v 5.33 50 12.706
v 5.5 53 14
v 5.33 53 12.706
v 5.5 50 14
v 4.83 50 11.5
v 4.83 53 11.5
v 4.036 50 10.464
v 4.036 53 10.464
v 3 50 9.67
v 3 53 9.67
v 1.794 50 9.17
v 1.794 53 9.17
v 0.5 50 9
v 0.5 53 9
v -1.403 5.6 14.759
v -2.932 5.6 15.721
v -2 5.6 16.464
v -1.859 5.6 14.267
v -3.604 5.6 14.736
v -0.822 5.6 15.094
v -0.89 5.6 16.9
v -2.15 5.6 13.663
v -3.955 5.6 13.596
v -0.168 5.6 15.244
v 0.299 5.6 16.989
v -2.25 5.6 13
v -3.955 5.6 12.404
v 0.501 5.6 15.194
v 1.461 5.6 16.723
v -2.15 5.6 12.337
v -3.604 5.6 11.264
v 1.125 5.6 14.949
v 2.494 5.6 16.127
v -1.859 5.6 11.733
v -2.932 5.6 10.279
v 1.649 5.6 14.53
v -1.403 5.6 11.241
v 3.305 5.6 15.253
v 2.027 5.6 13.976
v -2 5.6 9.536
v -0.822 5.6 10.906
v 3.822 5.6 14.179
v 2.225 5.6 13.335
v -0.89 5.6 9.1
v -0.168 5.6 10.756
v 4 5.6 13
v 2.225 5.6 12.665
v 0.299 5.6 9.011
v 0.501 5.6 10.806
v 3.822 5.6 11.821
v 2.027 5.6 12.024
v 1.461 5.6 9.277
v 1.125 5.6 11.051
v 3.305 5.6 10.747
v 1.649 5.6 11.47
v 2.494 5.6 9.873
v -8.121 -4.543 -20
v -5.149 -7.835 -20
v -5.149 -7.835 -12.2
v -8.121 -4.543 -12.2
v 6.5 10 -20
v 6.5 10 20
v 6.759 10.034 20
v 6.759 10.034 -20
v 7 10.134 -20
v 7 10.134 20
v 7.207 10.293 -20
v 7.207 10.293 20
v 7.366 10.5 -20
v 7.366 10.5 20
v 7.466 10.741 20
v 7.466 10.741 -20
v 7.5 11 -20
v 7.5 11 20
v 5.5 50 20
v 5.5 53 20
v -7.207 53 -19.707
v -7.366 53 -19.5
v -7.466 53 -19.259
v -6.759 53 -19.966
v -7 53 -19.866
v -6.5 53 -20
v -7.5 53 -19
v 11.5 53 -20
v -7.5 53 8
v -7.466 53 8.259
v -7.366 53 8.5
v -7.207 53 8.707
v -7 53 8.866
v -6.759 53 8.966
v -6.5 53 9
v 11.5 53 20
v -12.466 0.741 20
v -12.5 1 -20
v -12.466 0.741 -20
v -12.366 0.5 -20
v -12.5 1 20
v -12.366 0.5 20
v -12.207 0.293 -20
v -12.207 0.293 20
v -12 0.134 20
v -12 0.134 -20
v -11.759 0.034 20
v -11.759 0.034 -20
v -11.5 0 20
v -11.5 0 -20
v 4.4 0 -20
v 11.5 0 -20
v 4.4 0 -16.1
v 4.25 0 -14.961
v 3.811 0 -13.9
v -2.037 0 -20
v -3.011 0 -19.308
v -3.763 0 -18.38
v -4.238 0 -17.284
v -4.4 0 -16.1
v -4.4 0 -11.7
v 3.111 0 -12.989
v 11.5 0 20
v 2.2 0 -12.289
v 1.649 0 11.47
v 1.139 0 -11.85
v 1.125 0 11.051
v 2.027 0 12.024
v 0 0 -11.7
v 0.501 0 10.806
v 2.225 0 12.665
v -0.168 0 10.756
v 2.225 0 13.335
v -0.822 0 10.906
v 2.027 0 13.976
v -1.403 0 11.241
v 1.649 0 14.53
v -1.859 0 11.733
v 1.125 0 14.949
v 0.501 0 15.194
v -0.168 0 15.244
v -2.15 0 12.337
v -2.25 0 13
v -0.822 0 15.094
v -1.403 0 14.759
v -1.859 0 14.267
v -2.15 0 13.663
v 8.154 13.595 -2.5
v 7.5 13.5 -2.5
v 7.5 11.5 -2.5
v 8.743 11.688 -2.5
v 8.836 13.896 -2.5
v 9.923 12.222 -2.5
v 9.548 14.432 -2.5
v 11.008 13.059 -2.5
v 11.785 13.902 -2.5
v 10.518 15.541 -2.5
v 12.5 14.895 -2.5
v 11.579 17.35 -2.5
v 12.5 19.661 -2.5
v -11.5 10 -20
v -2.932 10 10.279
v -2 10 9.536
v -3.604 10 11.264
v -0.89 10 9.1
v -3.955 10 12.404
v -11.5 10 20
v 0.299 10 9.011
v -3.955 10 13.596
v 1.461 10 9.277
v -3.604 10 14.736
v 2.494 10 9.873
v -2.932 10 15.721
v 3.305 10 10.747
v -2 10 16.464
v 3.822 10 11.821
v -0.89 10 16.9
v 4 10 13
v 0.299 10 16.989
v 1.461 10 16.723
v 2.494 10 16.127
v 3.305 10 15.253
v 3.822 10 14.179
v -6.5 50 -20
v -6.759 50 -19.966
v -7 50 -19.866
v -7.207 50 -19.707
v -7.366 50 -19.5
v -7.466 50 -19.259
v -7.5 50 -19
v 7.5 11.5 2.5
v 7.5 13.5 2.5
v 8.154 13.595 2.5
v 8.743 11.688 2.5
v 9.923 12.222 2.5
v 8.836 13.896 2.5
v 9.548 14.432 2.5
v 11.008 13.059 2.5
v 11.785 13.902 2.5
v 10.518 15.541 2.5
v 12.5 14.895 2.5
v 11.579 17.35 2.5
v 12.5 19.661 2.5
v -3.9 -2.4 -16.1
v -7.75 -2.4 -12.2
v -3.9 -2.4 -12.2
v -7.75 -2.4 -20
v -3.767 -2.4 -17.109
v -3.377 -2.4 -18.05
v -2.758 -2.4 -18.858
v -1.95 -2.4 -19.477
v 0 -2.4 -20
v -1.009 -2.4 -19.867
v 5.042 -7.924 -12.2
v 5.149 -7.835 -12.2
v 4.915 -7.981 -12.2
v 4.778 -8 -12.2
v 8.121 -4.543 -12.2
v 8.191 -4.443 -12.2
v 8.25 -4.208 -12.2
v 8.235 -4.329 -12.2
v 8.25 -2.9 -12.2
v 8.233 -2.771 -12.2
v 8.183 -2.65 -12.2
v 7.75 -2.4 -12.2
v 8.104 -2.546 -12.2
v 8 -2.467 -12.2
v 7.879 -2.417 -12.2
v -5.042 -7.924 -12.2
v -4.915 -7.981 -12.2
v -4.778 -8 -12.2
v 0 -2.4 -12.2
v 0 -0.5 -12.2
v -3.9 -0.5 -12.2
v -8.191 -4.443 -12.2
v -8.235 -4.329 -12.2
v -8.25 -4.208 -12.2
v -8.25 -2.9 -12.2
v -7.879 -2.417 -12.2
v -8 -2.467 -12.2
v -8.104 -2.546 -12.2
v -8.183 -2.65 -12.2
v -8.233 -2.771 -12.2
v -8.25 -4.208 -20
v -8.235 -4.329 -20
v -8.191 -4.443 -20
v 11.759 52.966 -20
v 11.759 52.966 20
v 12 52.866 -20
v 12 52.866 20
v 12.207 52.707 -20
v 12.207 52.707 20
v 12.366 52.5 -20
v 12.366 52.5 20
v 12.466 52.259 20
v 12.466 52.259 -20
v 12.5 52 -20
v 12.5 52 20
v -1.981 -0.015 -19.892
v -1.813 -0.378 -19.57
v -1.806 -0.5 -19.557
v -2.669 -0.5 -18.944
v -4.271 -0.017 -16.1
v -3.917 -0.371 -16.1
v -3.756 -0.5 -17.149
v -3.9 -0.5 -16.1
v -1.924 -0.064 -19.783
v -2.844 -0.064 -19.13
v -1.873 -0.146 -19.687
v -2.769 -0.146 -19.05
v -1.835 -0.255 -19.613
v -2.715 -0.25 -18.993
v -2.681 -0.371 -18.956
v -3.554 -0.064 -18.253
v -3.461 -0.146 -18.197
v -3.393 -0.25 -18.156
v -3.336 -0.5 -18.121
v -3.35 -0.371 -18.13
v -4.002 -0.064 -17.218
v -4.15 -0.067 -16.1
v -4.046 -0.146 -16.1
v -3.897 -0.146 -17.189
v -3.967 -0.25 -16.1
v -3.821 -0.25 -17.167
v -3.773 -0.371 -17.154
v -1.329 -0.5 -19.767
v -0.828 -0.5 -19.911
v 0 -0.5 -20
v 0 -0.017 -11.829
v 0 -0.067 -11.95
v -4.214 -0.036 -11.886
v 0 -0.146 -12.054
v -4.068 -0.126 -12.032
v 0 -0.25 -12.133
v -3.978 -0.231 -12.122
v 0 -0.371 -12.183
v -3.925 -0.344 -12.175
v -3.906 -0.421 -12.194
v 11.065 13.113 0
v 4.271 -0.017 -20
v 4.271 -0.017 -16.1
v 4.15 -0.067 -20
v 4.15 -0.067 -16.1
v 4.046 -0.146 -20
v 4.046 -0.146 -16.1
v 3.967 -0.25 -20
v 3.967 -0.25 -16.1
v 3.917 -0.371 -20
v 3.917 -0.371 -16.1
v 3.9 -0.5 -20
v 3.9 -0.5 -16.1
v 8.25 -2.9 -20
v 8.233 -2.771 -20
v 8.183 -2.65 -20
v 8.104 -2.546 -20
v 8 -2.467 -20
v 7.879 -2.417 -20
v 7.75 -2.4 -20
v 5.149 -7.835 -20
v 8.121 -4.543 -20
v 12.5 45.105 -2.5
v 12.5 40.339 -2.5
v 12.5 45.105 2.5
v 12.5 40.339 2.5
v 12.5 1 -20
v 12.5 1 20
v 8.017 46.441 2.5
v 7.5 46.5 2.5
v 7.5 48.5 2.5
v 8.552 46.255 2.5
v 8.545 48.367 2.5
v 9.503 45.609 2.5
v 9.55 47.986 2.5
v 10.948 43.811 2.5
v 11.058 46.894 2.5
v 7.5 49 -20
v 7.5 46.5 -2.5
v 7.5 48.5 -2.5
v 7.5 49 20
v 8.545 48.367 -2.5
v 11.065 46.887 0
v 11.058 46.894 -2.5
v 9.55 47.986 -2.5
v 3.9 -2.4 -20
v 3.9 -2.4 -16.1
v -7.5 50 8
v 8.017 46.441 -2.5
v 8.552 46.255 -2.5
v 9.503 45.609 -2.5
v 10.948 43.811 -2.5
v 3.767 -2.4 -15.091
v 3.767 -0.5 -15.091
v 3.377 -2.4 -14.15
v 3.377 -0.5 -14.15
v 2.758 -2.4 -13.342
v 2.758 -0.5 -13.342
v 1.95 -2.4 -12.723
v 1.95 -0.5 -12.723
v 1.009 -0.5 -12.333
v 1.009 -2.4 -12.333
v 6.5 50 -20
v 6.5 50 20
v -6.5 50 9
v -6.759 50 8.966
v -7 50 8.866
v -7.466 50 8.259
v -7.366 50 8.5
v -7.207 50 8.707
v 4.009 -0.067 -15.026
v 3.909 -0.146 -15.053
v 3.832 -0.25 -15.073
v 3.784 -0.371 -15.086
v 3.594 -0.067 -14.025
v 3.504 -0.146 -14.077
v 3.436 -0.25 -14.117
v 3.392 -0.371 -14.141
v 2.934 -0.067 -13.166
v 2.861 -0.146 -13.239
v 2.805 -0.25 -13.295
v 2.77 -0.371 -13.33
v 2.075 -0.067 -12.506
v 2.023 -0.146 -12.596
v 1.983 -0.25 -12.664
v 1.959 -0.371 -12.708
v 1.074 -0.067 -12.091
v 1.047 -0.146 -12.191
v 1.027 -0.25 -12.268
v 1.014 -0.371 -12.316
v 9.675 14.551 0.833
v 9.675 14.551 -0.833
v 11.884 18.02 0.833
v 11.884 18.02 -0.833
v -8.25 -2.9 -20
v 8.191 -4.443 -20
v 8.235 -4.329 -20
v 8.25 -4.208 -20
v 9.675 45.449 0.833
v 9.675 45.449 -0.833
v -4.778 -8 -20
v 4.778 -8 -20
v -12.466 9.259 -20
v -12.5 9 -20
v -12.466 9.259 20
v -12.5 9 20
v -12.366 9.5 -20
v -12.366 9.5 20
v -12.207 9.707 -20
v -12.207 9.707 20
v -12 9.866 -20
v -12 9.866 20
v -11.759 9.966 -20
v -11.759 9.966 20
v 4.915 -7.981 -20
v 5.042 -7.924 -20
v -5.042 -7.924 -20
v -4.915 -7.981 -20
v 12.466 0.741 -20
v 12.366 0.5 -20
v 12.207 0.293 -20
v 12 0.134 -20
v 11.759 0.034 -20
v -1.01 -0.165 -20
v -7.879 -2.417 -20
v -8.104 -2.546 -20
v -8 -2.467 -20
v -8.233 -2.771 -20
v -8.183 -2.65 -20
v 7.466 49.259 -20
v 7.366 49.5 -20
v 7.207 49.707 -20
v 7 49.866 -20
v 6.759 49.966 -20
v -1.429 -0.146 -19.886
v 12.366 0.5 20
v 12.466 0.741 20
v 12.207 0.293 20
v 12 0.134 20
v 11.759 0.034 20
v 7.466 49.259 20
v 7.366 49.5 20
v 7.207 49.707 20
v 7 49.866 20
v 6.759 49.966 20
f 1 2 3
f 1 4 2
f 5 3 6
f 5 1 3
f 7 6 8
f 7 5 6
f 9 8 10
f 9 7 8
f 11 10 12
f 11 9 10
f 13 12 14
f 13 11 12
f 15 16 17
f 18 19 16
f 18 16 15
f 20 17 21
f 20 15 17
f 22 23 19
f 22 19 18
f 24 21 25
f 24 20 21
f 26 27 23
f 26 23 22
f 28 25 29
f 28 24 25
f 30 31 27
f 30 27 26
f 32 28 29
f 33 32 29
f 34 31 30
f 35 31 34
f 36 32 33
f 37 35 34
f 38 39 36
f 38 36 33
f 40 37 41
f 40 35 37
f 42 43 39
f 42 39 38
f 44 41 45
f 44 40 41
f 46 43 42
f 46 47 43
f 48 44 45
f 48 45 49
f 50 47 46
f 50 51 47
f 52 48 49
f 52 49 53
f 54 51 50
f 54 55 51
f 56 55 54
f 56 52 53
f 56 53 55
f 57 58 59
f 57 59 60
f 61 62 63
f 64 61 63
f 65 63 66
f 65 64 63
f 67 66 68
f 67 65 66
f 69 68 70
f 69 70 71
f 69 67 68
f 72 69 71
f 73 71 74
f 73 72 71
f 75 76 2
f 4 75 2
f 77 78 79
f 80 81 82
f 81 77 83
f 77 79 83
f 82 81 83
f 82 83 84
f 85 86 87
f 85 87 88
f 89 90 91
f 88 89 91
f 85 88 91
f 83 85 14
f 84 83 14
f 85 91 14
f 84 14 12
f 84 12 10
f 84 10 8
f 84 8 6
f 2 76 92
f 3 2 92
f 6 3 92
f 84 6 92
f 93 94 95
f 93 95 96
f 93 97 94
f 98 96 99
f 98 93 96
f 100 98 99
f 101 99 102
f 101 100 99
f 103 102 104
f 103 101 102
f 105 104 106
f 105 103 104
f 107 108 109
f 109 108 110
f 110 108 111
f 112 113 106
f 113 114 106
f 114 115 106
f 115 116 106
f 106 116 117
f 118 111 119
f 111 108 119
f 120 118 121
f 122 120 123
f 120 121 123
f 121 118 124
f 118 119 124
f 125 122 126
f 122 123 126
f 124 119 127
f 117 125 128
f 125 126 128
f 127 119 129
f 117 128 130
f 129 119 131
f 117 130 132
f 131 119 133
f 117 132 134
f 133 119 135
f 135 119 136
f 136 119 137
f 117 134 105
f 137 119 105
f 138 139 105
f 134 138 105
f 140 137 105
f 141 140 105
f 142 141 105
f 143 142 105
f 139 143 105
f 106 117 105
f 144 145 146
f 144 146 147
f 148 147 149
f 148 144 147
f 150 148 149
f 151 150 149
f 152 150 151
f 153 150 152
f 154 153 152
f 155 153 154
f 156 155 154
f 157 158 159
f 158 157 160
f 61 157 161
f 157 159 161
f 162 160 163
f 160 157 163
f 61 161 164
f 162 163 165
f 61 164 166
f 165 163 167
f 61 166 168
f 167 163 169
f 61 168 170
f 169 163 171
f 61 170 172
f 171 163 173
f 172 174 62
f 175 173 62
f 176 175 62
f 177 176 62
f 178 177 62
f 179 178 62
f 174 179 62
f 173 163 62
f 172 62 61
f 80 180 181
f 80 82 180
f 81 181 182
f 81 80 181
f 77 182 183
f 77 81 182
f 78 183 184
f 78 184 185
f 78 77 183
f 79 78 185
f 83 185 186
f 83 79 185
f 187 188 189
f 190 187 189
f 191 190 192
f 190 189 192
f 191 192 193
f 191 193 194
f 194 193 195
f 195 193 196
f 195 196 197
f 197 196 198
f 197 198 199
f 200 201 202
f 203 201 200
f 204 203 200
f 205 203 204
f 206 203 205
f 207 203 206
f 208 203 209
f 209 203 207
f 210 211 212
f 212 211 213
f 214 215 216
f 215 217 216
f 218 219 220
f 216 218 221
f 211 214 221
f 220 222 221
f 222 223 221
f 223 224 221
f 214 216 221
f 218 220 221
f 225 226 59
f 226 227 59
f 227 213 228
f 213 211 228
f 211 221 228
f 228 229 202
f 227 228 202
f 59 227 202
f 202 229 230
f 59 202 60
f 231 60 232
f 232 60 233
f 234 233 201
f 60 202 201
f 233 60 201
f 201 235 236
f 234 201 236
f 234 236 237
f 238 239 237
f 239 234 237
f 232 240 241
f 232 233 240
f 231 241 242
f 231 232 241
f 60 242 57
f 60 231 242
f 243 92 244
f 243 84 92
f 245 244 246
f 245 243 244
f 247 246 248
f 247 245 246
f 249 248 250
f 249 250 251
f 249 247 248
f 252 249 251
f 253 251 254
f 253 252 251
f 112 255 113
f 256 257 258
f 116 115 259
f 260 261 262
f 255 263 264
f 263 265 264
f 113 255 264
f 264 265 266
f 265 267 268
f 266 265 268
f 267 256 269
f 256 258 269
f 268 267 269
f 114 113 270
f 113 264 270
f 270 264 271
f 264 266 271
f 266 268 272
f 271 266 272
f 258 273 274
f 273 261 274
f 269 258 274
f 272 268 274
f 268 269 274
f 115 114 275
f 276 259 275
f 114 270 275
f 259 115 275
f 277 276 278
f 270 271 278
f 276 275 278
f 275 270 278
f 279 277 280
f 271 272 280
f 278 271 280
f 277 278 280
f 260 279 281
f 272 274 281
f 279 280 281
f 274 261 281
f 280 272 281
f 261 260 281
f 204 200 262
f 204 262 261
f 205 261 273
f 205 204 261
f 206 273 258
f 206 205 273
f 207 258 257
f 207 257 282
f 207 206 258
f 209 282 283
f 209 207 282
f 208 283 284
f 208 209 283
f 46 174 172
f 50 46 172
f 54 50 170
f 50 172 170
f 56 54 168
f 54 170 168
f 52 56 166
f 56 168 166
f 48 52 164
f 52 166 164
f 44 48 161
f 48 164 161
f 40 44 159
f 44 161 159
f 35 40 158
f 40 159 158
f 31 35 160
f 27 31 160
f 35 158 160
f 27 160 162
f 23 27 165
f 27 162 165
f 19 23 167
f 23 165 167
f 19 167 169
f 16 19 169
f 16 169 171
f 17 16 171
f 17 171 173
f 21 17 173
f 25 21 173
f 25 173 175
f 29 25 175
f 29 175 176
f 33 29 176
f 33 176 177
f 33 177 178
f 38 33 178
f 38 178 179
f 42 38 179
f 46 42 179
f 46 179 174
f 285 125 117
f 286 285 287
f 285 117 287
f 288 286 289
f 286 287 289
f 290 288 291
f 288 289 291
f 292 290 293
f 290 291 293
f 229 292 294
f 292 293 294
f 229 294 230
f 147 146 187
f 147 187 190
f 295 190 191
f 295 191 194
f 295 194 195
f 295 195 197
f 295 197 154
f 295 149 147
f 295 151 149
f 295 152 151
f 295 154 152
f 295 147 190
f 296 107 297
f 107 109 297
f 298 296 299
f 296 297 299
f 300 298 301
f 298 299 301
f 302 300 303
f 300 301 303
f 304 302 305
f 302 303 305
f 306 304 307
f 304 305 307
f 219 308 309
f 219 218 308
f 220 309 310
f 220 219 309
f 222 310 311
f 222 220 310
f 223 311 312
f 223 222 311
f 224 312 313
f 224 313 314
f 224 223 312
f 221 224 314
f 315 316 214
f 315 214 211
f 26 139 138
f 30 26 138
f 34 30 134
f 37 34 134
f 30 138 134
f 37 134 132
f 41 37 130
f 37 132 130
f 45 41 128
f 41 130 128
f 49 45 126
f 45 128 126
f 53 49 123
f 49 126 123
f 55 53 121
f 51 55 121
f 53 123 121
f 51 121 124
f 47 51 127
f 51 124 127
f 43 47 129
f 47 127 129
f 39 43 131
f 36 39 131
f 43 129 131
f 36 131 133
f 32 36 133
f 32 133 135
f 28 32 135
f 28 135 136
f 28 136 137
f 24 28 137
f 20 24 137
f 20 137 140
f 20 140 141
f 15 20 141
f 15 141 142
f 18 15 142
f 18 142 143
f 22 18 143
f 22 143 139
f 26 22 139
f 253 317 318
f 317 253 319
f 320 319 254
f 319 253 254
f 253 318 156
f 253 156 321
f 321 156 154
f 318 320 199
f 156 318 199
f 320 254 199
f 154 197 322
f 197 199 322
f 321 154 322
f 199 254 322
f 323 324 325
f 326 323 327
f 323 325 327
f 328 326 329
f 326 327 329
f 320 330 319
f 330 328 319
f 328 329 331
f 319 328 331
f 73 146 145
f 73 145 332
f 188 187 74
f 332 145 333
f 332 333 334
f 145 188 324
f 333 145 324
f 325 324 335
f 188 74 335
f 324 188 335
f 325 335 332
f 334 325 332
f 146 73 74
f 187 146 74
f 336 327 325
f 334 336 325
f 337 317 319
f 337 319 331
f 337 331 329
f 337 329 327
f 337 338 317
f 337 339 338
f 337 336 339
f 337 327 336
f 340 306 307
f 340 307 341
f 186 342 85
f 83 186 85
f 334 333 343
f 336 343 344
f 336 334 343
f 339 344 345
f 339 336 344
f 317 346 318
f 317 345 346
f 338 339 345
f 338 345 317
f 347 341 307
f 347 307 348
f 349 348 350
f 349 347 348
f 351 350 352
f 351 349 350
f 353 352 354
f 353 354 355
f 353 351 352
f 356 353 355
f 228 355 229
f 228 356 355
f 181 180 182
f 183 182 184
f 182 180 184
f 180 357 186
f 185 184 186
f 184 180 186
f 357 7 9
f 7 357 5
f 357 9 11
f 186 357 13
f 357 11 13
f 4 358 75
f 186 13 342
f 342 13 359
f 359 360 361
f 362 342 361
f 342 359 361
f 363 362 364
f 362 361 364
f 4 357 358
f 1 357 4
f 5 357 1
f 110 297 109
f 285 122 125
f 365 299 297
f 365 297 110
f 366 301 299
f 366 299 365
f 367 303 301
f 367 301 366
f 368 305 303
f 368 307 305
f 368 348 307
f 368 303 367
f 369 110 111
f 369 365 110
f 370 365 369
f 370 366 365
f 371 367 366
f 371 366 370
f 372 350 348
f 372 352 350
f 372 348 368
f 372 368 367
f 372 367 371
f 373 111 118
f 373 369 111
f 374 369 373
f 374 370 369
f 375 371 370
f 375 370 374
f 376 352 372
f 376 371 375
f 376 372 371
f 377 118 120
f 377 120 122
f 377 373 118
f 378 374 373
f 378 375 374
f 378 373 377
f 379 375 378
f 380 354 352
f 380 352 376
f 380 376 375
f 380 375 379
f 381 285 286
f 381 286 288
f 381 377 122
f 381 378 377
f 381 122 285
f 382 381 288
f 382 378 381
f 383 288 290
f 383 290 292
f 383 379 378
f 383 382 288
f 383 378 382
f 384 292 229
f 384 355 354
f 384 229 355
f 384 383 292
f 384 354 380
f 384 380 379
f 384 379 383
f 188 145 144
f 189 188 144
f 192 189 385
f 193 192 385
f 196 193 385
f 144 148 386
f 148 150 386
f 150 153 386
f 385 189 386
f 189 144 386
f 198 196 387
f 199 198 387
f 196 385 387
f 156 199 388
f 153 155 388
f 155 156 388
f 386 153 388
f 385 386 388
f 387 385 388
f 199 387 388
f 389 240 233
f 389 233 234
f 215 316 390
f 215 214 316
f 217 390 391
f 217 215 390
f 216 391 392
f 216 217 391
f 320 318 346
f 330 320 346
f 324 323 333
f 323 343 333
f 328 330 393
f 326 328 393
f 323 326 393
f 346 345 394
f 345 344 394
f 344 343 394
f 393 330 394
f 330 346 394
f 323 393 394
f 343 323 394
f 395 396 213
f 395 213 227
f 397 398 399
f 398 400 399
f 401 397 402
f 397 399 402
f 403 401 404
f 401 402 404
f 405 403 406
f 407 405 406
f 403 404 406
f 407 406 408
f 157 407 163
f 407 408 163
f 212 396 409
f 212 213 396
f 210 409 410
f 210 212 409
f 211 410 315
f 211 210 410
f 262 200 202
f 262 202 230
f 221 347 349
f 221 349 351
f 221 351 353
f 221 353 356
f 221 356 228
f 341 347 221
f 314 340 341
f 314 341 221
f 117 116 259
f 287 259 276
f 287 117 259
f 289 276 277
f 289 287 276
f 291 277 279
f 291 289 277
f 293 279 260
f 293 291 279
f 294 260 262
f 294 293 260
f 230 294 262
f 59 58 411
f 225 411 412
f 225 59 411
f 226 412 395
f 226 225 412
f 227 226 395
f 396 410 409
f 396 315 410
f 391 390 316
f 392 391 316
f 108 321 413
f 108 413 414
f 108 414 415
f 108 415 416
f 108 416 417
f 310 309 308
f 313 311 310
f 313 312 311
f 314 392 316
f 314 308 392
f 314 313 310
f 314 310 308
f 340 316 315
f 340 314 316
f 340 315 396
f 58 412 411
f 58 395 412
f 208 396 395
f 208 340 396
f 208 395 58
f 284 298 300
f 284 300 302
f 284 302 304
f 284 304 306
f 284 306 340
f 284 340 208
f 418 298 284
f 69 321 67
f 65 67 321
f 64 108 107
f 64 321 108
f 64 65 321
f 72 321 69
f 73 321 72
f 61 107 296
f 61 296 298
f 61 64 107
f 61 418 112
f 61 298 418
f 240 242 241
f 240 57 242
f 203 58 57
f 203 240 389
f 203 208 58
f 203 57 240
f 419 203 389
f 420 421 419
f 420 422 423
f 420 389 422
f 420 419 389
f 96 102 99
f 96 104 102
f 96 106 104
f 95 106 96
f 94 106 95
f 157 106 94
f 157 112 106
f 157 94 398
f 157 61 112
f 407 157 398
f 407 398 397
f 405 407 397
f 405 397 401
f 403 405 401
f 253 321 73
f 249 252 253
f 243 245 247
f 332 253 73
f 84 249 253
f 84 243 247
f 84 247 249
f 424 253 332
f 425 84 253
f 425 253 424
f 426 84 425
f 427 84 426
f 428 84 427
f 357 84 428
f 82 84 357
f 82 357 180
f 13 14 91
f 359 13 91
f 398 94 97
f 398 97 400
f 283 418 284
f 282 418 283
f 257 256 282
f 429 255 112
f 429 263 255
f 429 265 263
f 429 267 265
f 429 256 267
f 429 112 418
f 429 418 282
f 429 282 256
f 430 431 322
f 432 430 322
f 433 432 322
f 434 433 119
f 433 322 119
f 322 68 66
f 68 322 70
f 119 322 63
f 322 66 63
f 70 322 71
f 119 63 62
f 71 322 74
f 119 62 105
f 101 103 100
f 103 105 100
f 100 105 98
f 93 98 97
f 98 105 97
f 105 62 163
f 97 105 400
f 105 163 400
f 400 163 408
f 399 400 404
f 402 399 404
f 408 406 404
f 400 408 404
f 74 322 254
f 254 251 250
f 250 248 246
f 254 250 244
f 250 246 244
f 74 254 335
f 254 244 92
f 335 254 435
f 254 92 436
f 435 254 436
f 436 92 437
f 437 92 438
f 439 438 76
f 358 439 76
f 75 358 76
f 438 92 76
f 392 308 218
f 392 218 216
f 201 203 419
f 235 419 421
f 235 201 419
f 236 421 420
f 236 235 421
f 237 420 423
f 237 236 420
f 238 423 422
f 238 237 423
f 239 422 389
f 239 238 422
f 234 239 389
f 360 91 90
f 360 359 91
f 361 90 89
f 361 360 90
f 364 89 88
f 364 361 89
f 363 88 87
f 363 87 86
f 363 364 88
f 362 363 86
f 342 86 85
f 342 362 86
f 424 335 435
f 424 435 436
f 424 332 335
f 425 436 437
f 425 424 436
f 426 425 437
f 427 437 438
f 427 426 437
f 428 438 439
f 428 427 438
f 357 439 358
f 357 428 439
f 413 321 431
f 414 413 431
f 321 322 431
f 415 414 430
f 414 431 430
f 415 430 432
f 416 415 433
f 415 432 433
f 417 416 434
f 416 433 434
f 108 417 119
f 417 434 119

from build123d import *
from OCP.BRepFilletAPI import BRepFilletAPI_MakeFillet

# Parameters (mm, degrees)
BOSS_EXTRUDE1_DEPTH                                 = 20
CBORE_FOR_M4_HEX_SOCKET_HEAD_CAP_SCREW1_D           = 4.5
CBORE_FOR_M4_HEX_SOCKET_HEAD_CAP_SCREW1_DEPTH       = 10
CBORE_FOR_M4_HEX_SOCKET_HEAD_CAP_SCREW1_CBORE_D     = 8
CBORE_FOR_M4_HEX_SOCKET_HEAD_CAP_SCREW1_CBORE_DEPTH = 4.4
BOSS_EXTRUDE3_DEPTH                                 = 7.8
CUT_EXTRUDE1_DEPTH                                  = 2.4
FILLET3_R                                           = 0.5
CUT_SWEEP1_START                                    = -2.5
CUT_SWEEP1_DEPTH                                    = 5
CUT_EXTRUDE2_REACH                                  = 67.401
SKETCH14_R                                          = 4
FILLET4_R1                                          = 1
FILLET4_R2                                          = 5


# Read off the part's stored shape, not the designer's step: Cut-Sweep1
with BuildPart() as part:
    # Sketch1 → Boss-Extrude1 (new, symmetric)
    with BuildSketch(Plane.XY):
        Polygon((-12.5, 10), (7.5, 10), (7.5, 50), (-7.5, 50), (-7.5, 53), (12.5, 53), (12.5, 0), (-12.5, 0), align=None)
    extrude(amount=BOSS_EXTRUDE1_DEPTH, both=True)

    # CBORE for M4 Hex Socket Head Cap Screw1
    with Locations(Plane(origin=(0, 10, 0), x_dir=(1, 0, 0), z_dir=(0, 1, 0))):
        with Locations((0, -13)):
            CounterBoreHole(CBORE_FOR_M4_HEX_SOCKET_HEAD_CAP_SCREW1_D / 2, CBORE_FOR_M4_HEX_SOCKET_HEAD_CAP_SCREW1_CBORE_D / 2, CBORE_FOR_M4_HEX_SOCKET_HEAD_CAP_SCREW1_CBORE_DEPTH, depth=CBORE_FOR_M4_HEX_SOCKET_HEAD_CAP_SCREW1_DEPTH)

    # Sketch5 → Boss-Extrude3 (add)
    with BuildSketch(Plane(origin=(0, 0, -20), x_dir=(-1, 0, 0), z_dir=(0, 0, -1))):
        Polygon((-5, -8), (5, -8), (8.25, -4.4), (8.25, -2.4), (3.9, -2.4), (3.9, 0), (-3.9, 0), (-3.9, -2.4), (-8.25, -2.4), (-8.25, -4.4), align=None)
    extrude(amount=-BOSS_EXTRUDE3_DEPTH)

    # Sketch6 → Cut-Extrude1 (cut)
    with BuildSketch(Plane(origin=(0, -2.4, 0), x_dir=(1, 0, 0), z_dir=(0, 1, 0))):
        with BuildLine():
            ThreePointArc((-3.9, 16.1), (-2.757716447, 18.857716447), (0, 20))
            Line((0, 20), (-3.9, 20))
            Line((-3.9, 20), (-3.9, 16.1))
        make_face()
        with BuildLine():
            Line((3.9, 12.2), (3.9, 16.1))
            ThreePointArc((3.9, 16.1), (2.757716447, 13.342283553), (0, 12.2))
            Line((0, 12.2), (3.9, 12.2))
        make_face()
    extrude(amount=CUT_EXTRUDE1_DEPTH, mode=Mode.SUBTRACT)

    # Fillet3
    fillet3_edges = [part.edges().sort_by_distance(p)[0] for p in [
        (3.9, 0, -18.05),
        (2.757716447, 0, -13.342283553),
        (-1.95, 0, -12.2),
    ]]
    fillet(fillet3_edges, radius=FILLET3_R)
    fillet3_2_edges = [part.edges().sort_by_distance(p)[0] for p in [
        (-3.9, 0, -14.15),
        (-2.757716447, 0, -18.857716447),
    ]]
    fillet(fillet3_2_edges, radius=FILLET3_R)
    fillet3_3_edges = [part.edges().sort_by_distance(p)[0] for p in [
        (-8.25, -2.4, -16.1),
    ]]
    fillet(fillet3_3_edges, radius=FILLET3_R)
    fillet3_4_edges = [part.edges().sort_by_distance(p)[0] for p in [
        (-8.25, -4.4, -16.1),
    ]]
    fillet(fillet3_4_edges, radius=FILLET3_R)
    fillet3_5_edges = [part.edges().sort_by_distance(p)[0] for p in [
        (-5, -8, -16.1),
    ]]
    fillet(fillet3_5_edges, radius=FILLET3_R)
    fillet3_6_edges = [part.edges().sort_by_distance(p)[0] for p in [
        (5, -8, -16.1),
    ]]
    fillet(fillet3_6_edges, radius=FILLET3_R)
    fillet3_7_edges = [part.edges().sort_by_distance(p)[0] for p in [
        (8.25, -4.4, -16.1),
    ]]
    fillet(fillet3_7_edges, radius=FILLET3_R)
    fillet3_8_edges = [part.edges().sort_by_distance(p)[0] for p in [
        (8.25, -2.4, -16.1),
    ]]
    fillet(fillet3_8_edges, radius=FILLET3_R)

    # Cut-Sweep1 outline → Cut-Sweep1 (cut)
    with BuildSketch(Plane.XY.offset(CUT_SWEEP1_START)):
        with BuildLine():
            Line((12.500000017, 40.338970285), (12.5, 45.105483834))
            add(Edge.make_bspline(
                [(12.5, 45.105483834), (12.059714128, 45.789978249), (11.581411154, 46.38791258), (10.025035585, 47.892146935), (8.787180136, 48.5), (7.5, 48.5)],
                knots=[0.656472281, 0.656472281, 0.656472281, 0.656472281, 0.6875, 0.6875, 0.75, 0.75, 0.75, 0.75], degree=3))
            Line((7.5, 48.5), (7.5, 46.5))
            add(Edge.make_bspline(
                [(12.500000017, 40.338970285), (12.309154865, 40.920252732), (12.103143429, 41.469478304), (11.227294674, 43.513125401), (10.449149583, 44.700789342), (8.901182872, 46.196896563), (8.176315005, 46.5), (7.5, 46.5)],
                knots=[0.604163443, 0.604163443, 0.604163443, 0.604163443, 0.625, 0.625, 0.6875, 0.6875, 0.75, 0.75, 0.75, 0.75], degree=3))
        make_face()
        with BuildLine():
            Line((12.5, 14.894516166), (12.500000017, 19.661029715))
            add(Edge.make_bspline(
                [(7.5, 13.5), (8.176315005, 13.5), (8.901182872, 13.803103437), (10.449149583, 15.299210658), (11.227294674, 16.486874599), (12.103143429, 18.530521696), (12.309154865, 19.079747268), (12.500000017, 19.661029715)],
                knots=[0.25, 0.25, 0.25, 0.25, 0.3125, 0.3125, 0.375, 0.375, 0.395836557, 0.395836557, 0.395836557, 0.395836557], degree=3))
            Line((7.5, 13.5), (7.5, 11.5))
            add(Edge.make_bspline(
                [(7.5, 11.5), (8.787180136, 11.5), (10.025035585, 12.107853065), (11.581411154, 13.61208742), (12.059714128, 14.210021751), (12.5, 14.894516166)],
                knots=[0.25, 0.25, 0.25, 0.25, 0.3125, 0.3125, 0.343527719, 0.343527719, 0.343527719, 0.343527719], degree=3))
        make_face()
    extrude(amount=CUT_SWEEP1_DEPTH, mode=Mode.SUBTRACT)

    # Sketch14 → Cut-Extrude2 (cut, up to next)
    with BuildSketch(Plane(origin=(0, 53, 0), x_dir=(1, 0, 0), z_dir=(0, 1, 0)), mode=Mode.PRIVATE) as cut_extrude2_sk1:
        Polygon((-7.5, -20), (5.5, -20), (5.5, -9), (0, -9), (-7.5, -9), align=None)
        with BuildLine():
            ThreePointArc((4, -13), (-2.828427125, -15.828427125), (0, -9))
            ThreePointArc((0, -9), (2.828427125, -10.171572875), (4, -13))
        make_face(mode=Mode.SUBTRACT)
    cut_extrude2_tool1 = extrude(cut_extrude2_sk1.sketch, amount=-CUT_EXTRUDE2_REACH, mode=Mode.PRIVATE) & part.part
    # Sketch14 → Cut-Extrude2 (cut, up to next)
    with BuildSketch(Plane(origin=(0, 53, 0), x_dir=(1, 0, 0), z_dir=(0, 1, 0)), mode=Mode.PRIVATE) as cut_extrude2_sk2:
        with Locations(Location((0, -13, 0), (0, 0, 270))):
            Circle(SKETCH14_R)
    cut_extrude2_tool2 = extrude(cut_extrude2_sk2.sketch, amount=-CUT_EXTRUDE2_REACH, mode=Mode.PRIVATE) & part.part
    add(cut_extrude2_tool1.solids().sort_by_distance((-1, 53, 19.829706))[0], mode=Mode.SUBTRACT)
    add(cut_extrude2_tool2.solids().sort_by_distance((0, 53, 13))[0], mode=Mode.SUBTRACT)

    # Fillet4: one fillet with a radius per group of edges: ONE call of the kernel's fillet builder (fillet() takes one radius for all edges)
    fillet4_edges_1 = [part.edges().sort_by_distance(p)[0] for p in [
        (-12.5, 10, 0),
        (7.5, 10, 0),
        (7.5, 50, 0),
        (12.5, 53, 0),
        (12.5, 0, 0),
        (-12.5, 0, 0),
        (-7.5, 51.5, 9),
        (-7.5, 51.5, -20),
    ]]
    fillet4_edges_2 = [part.edges().sort_by_distance(p)[0] for p in [
        (5.5, 51.5, 9),
    ]]
    fillet4 = BRepFilletAPI_MakeFillet(part.part.solid().wrapped)
    for e in fillet4_edges_1:
        fillet4.Add(FILLET4_R1, e.wrapped)
    for e in fillet4_edges_2:
        fillet4.Add(FILLET4_R2, e.wrapped)
    add(Compound.cast(fillet4.Shape()), mode=Mode.REPLACE)


solid = part.part
